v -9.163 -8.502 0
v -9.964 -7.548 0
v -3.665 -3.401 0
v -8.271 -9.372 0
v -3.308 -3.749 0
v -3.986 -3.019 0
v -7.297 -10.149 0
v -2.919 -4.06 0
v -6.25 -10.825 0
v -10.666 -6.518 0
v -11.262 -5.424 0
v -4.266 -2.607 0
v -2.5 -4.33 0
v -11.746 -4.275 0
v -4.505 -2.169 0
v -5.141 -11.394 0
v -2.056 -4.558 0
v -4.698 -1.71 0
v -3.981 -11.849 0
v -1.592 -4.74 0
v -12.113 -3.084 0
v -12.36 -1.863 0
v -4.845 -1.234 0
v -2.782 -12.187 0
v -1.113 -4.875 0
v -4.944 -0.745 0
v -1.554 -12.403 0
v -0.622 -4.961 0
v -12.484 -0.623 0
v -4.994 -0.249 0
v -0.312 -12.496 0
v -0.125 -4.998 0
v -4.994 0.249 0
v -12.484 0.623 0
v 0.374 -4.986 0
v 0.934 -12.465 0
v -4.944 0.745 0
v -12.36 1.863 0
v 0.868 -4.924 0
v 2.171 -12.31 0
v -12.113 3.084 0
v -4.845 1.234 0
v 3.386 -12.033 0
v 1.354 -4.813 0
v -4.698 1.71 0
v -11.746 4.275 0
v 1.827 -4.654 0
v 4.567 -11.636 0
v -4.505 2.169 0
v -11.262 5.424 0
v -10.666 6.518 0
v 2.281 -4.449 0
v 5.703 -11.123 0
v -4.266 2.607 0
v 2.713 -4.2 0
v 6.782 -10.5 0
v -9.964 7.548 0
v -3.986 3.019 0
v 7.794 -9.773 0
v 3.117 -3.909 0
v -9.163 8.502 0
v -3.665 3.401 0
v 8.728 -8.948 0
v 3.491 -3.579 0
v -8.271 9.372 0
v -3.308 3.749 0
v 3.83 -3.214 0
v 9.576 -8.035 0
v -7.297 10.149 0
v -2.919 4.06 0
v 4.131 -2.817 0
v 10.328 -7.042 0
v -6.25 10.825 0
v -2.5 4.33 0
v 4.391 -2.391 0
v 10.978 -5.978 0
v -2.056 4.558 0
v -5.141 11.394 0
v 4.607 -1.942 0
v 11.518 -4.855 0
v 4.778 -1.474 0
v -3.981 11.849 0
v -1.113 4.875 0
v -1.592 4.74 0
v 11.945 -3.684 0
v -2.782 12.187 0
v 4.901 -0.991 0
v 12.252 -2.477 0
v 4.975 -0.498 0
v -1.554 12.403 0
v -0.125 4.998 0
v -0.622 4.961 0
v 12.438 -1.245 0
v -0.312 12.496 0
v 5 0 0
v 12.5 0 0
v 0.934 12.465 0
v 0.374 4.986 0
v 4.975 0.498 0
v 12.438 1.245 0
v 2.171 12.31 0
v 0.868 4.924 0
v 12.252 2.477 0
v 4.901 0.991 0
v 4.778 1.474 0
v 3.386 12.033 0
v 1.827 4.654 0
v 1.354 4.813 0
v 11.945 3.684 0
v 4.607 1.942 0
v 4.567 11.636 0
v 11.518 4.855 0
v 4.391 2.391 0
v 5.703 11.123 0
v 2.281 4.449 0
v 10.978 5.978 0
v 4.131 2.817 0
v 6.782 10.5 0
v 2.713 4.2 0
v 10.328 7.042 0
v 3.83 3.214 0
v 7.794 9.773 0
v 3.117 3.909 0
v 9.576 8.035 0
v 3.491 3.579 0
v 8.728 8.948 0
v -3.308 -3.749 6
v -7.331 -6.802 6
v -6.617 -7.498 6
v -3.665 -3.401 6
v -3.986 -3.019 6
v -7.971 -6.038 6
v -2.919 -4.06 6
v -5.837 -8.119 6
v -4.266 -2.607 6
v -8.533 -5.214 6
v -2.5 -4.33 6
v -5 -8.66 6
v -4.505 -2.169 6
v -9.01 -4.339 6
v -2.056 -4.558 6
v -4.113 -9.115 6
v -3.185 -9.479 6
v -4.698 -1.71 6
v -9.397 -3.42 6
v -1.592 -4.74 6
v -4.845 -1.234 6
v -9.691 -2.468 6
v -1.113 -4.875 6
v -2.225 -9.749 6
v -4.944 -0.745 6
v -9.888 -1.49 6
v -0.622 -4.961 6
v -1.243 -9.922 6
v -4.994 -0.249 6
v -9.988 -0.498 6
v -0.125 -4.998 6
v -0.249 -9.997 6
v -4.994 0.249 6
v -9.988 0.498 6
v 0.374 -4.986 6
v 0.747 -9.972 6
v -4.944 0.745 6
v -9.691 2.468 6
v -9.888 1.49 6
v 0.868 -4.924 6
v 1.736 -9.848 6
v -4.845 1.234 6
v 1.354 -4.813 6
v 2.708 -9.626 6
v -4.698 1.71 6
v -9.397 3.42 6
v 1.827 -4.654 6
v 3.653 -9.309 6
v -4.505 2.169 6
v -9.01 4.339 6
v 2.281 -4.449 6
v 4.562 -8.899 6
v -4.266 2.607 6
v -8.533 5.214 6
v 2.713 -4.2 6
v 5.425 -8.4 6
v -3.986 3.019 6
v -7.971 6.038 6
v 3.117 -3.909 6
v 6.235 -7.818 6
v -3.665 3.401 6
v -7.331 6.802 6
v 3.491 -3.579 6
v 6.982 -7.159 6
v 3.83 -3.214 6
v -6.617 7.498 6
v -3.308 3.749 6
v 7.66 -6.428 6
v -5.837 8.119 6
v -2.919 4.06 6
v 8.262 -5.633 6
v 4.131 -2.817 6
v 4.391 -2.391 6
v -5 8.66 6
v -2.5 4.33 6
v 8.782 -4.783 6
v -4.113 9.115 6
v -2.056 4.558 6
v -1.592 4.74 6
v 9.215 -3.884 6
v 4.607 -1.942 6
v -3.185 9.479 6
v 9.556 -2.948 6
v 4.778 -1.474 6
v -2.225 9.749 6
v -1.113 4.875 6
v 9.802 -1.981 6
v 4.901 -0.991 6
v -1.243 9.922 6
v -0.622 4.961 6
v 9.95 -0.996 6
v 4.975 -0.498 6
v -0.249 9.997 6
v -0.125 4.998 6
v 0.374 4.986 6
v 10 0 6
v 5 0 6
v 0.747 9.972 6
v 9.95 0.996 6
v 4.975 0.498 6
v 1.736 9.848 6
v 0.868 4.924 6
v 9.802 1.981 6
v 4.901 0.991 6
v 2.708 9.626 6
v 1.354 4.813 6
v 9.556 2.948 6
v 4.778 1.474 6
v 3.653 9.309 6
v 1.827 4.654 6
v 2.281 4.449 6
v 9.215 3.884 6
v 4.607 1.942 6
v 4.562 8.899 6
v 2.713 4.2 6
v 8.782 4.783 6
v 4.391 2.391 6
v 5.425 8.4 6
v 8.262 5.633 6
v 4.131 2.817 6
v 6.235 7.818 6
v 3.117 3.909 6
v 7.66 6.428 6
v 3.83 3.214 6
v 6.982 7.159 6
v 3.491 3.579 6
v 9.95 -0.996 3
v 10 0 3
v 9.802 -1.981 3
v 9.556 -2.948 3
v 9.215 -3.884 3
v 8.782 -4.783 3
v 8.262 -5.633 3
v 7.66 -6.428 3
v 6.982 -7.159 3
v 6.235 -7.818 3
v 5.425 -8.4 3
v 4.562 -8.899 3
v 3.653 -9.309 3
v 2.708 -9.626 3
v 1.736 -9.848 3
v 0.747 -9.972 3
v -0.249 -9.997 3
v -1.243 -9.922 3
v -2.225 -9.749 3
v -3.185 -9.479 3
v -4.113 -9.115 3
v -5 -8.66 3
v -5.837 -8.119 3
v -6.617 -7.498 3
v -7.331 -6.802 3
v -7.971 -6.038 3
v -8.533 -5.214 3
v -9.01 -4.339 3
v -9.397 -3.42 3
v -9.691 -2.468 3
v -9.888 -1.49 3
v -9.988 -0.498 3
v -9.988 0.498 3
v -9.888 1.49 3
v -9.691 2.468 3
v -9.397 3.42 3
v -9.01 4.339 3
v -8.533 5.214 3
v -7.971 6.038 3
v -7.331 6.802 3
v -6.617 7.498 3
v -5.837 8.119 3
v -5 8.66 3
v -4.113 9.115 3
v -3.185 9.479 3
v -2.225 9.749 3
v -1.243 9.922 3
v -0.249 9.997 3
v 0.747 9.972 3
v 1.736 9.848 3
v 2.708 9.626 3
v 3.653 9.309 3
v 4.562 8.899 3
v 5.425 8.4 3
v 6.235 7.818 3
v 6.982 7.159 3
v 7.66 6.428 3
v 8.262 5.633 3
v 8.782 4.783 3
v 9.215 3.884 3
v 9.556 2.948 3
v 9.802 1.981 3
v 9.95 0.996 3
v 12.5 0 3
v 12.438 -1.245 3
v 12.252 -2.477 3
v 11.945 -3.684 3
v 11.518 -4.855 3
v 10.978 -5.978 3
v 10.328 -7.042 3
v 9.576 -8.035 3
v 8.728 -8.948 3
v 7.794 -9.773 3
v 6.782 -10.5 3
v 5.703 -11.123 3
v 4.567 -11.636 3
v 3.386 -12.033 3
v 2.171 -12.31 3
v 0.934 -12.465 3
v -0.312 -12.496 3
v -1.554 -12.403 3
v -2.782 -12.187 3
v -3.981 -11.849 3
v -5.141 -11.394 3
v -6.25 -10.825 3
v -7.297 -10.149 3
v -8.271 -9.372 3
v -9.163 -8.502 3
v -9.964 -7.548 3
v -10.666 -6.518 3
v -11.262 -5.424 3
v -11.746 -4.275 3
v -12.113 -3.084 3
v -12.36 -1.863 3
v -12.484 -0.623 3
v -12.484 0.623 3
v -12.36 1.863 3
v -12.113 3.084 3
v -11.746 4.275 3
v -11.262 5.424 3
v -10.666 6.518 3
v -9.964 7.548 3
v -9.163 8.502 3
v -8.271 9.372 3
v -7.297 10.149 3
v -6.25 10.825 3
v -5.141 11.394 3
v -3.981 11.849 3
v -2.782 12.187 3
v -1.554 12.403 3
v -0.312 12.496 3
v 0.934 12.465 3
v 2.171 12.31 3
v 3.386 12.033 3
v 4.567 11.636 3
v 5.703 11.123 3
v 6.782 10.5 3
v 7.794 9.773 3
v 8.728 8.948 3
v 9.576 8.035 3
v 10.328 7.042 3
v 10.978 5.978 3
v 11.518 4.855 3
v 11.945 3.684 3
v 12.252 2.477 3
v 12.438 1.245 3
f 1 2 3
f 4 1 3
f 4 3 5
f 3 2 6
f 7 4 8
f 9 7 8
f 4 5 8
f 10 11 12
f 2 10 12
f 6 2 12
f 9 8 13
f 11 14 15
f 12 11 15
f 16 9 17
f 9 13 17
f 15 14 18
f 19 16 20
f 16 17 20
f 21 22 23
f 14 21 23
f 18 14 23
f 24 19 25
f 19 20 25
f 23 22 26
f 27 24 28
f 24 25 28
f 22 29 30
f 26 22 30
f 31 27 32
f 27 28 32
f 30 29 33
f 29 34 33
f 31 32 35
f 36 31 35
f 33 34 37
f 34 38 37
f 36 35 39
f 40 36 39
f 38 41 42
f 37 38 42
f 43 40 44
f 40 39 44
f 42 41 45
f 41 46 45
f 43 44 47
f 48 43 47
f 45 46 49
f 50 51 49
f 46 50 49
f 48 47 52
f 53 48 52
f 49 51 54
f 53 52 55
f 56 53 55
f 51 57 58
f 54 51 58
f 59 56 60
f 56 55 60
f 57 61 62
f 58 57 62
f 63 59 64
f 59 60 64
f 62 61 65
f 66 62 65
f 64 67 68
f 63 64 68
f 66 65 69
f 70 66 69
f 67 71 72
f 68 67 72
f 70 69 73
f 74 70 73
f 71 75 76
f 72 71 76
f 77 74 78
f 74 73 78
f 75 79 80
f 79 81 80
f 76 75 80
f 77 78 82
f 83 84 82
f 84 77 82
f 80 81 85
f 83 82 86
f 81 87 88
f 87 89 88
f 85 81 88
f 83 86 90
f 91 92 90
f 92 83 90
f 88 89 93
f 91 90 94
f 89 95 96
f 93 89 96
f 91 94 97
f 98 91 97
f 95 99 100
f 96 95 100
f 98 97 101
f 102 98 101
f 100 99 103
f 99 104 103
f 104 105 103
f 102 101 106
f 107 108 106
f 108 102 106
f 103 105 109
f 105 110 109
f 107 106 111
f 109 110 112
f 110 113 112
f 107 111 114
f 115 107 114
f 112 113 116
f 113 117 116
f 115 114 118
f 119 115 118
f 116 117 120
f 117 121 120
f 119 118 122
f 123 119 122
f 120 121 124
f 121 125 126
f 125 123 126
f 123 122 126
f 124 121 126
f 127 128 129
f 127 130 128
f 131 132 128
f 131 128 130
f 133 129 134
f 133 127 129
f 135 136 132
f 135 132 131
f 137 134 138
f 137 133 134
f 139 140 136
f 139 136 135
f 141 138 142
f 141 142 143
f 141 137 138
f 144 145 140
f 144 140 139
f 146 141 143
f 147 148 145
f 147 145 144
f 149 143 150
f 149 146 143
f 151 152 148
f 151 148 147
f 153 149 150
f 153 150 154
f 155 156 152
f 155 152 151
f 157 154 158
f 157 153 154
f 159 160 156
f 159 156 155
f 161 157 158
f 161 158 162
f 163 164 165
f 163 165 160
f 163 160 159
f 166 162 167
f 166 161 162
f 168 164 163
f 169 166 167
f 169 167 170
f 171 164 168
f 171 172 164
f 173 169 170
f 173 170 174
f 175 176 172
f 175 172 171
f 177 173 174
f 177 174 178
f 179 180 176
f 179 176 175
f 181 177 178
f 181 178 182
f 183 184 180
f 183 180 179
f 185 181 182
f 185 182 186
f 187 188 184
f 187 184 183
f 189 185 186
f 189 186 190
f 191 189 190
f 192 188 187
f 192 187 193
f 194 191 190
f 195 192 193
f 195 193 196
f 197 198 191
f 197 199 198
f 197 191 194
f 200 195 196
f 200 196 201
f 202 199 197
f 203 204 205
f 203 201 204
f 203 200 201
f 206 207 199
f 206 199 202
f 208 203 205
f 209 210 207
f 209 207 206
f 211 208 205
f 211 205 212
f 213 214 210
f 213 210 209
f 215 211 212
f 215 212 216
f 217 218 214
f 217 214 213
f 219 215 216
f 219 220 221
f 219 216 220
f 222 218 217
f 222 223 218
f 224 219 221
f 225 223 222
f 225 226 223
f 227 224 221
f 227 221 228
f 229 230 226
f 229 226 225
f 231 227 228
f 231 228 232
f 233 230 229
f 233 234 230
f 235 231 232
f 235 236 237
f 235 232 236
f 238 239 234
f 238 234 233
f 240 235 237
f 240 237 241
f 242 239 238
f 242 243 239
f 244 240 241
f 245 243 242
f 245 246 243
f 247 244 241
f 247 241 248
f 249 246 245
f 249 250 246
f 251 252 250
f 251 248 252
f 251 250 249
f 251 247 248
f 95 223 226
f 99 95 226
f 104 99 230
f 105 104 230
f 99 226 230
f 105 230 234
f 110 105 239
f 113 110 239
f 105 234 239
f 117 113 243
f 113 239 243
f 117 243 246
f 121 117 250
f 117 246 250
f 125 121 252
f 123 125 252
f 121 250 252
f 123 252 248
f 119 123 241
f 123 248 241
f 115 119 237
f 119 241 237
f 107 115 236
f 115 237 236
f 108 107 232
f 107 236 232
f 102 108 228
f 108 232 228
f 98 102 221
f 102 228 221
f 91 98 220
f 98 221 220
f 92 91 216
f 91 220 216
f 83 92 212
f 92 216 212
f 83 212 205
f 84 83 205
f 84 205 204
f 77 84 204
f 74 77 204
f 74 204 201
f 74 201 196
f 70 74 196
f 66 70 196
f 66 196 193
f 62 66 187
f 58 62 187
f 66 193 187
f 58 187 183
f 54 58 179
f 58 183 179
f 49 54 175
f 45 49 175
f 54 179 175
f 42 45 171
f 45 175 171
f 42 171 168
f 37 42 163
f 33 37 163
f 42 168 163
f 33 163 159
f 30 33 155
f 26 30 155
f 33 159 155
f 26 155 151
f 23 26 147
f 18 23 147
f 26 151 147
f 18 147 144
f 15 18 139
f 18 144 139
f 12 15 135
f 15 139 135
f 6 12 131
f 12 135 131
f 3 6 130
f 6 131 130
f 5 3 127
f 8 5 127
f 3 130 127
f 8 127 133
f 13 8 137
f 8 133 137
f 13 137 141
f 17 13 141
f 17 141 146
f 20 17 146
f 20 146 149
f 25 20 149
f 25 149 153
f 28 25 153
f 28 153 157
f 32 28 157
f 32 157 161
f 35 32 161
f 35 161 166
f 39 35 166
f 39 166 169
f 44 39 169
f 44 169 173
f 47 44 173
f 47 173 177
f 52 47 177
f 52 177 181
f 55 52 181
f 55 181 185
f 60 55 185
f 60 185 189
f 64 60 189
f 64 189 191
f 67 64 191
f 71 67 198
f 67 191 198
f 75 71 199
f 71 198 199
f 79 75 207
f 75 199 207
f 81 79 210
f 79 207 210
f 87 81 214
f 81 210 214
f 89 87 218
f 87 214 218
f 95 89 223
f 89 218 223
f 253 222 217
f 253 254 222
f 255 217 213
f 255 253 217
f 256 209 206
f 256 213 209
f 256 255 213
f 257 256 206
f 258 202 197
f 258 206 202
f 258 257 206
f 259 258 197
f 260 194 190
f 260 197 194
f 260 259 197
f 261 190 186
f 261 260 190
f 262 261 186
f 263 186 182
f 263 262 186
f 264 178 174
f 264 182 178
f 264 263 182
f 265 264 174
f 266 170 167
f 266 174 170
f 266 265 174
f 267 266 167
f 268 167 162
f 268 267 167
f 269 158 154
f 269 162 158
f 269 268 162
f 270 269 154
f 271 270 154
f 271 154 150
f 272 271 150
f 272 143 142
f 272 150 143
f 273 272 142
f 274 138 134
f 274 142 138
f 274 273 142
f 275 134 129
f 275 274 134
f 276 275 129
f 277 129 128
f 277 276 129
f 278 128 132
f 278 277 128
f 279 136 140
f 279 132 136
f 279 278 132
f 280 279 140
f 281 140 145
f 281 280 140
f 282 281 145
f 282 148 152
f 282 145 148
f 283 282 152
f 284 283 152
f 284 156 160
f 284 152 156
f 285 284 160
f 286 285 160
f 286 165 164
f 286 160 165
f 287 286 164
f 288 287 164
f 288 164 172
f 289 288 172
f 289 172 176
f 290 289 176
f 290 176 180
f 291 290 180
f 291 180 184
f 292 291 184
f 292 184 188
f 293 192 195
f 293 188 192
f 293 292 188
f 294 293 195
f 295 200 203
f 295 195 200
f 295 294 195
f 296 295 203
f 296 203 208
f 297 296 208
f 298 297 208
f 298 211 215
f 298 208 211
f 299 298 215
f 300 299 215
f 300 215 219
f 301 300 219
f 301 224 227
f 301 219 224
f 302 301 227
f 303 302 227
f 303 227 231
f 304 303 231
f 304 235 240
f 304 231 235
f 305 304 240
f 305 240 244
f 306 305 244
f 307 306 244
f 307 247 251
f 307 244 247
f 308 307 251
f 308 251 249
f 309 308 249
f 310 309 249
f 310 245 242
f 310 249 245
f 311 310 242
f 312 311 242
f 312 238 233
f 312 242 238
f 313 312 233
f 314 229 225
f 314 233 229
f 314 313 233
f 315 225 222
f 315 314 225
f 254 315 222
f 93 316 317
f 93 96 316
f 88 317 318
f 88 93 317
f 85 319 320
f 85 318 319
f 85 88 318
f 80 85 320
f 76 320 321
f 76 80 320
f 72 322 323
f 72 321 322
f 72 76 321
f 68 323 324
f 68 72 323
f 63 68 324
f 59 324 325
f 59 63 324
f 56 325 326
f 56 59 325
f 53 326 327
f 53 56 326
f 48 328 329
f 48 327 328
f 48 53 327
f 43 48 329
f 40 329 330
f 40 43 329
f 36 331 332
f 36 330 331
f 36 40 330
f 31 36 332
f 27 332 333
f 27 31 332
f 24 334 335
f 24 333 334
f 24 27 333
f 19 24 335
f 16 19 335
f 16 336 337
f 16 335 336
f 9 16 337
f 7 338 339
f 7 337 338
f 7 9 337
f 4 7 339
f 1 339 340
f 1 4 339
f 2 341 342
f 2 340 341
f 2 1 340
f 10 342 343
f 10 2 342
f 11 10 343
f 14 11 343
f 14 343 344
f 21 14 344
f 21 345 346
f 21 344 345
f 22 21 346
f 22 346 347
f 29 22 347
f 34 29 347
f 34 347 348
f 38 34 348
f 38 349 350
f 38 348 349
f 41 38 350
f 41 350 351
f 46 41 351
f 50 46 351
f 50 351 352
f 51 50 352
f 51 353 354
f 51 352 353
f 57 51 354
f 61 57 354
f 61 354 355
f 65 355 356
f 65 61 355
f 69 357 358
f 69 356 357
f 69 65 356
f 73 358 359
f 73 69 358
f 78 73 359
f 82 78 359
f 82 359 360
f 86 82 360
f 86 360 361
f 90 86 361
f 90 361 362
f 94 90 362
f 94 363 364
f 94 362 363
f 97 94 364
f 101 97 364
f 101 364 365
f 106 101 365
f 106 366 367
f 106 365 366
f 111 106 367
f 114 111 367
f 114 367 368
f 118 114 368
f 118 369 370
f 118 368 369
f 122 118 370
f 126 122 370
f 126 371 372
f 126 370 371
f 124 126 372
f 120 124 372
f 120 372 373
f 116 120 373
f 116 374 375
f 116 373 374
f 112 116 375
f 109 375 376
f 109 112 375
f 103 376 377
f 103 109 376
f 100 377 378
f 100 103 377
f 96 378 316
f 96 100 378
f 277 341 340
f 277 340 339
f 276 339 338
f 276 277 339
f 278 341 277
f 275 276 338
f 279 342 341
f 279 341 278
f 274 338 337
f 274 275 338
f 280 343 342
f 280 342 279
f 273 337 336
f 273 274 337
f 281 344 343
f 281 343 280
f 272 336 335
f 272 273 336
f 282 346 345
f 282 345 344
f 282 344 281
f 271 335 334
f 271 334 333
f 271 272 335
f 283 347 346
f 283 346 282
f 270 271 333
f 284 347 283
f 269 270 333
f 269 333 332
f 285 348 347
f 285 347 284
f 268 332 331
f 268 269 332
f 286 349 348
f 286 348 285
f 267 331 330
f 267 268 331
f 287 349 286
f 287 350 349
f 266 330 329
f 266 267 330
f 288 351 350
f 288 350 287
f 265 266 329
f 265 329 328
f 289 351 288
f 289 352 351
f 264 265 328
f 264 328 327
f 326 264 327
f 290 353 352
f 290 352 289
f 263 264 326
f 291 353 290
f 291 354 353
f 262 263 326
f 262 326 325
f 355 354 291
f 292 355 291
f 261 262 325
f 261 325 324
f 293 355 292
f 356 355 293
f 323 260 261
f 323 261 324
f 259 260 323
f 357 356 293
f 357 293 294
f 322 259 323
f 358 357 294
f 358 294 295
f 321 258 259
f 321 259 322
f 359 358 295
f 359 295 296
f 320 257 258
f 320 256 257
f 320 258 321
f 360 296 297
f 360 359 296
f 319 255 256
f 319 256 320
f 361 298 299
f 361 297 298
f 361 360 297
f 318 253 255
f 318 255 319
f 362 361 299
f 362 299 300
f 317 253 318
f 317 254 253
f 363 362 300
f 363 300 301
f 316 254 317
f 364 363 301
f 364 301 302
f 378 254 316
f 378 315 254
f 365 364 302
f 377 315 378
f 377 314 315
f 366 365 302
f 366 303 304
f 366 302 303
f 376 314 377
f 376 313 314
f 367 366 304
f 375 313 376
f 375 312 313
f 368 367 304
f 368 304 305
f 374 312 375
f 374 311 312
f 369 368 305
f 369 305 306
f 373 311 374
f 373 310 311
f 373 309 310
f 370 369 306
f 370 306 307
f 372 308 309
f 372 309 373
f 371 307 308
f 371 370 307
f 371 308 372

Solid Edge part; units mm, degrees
sketch "Sketch1" plane through (0, 0, 0) normal (0, 0, 1) x (1, 0, 0)
  circle A0 centre (0, 0) radius 12.5
  dimension "D1" = 25
extrude "Protrusion1" add sketch "Sketch1" along normal blind 3
sketch "Sketch2" plane through (0, 0, 3) normal (0, 0, 1) x (1, 0, 0)
  circle A0 centre (0, 0) radius 10
  dimension "D1" = 20
extrude "ProtrusioneEstrusa_2" add sketch "Sketch2" along normal blind 3
sketch "Sketch3" plane through (0, 0, 6) normal (0, 0, 1) x (1, 0, 0)
  circle A0 centre (0, 0) radius 5
  dimension "D1" = 10
extrude "Cutout1" cut sketch "Sketch3" against normal through all
